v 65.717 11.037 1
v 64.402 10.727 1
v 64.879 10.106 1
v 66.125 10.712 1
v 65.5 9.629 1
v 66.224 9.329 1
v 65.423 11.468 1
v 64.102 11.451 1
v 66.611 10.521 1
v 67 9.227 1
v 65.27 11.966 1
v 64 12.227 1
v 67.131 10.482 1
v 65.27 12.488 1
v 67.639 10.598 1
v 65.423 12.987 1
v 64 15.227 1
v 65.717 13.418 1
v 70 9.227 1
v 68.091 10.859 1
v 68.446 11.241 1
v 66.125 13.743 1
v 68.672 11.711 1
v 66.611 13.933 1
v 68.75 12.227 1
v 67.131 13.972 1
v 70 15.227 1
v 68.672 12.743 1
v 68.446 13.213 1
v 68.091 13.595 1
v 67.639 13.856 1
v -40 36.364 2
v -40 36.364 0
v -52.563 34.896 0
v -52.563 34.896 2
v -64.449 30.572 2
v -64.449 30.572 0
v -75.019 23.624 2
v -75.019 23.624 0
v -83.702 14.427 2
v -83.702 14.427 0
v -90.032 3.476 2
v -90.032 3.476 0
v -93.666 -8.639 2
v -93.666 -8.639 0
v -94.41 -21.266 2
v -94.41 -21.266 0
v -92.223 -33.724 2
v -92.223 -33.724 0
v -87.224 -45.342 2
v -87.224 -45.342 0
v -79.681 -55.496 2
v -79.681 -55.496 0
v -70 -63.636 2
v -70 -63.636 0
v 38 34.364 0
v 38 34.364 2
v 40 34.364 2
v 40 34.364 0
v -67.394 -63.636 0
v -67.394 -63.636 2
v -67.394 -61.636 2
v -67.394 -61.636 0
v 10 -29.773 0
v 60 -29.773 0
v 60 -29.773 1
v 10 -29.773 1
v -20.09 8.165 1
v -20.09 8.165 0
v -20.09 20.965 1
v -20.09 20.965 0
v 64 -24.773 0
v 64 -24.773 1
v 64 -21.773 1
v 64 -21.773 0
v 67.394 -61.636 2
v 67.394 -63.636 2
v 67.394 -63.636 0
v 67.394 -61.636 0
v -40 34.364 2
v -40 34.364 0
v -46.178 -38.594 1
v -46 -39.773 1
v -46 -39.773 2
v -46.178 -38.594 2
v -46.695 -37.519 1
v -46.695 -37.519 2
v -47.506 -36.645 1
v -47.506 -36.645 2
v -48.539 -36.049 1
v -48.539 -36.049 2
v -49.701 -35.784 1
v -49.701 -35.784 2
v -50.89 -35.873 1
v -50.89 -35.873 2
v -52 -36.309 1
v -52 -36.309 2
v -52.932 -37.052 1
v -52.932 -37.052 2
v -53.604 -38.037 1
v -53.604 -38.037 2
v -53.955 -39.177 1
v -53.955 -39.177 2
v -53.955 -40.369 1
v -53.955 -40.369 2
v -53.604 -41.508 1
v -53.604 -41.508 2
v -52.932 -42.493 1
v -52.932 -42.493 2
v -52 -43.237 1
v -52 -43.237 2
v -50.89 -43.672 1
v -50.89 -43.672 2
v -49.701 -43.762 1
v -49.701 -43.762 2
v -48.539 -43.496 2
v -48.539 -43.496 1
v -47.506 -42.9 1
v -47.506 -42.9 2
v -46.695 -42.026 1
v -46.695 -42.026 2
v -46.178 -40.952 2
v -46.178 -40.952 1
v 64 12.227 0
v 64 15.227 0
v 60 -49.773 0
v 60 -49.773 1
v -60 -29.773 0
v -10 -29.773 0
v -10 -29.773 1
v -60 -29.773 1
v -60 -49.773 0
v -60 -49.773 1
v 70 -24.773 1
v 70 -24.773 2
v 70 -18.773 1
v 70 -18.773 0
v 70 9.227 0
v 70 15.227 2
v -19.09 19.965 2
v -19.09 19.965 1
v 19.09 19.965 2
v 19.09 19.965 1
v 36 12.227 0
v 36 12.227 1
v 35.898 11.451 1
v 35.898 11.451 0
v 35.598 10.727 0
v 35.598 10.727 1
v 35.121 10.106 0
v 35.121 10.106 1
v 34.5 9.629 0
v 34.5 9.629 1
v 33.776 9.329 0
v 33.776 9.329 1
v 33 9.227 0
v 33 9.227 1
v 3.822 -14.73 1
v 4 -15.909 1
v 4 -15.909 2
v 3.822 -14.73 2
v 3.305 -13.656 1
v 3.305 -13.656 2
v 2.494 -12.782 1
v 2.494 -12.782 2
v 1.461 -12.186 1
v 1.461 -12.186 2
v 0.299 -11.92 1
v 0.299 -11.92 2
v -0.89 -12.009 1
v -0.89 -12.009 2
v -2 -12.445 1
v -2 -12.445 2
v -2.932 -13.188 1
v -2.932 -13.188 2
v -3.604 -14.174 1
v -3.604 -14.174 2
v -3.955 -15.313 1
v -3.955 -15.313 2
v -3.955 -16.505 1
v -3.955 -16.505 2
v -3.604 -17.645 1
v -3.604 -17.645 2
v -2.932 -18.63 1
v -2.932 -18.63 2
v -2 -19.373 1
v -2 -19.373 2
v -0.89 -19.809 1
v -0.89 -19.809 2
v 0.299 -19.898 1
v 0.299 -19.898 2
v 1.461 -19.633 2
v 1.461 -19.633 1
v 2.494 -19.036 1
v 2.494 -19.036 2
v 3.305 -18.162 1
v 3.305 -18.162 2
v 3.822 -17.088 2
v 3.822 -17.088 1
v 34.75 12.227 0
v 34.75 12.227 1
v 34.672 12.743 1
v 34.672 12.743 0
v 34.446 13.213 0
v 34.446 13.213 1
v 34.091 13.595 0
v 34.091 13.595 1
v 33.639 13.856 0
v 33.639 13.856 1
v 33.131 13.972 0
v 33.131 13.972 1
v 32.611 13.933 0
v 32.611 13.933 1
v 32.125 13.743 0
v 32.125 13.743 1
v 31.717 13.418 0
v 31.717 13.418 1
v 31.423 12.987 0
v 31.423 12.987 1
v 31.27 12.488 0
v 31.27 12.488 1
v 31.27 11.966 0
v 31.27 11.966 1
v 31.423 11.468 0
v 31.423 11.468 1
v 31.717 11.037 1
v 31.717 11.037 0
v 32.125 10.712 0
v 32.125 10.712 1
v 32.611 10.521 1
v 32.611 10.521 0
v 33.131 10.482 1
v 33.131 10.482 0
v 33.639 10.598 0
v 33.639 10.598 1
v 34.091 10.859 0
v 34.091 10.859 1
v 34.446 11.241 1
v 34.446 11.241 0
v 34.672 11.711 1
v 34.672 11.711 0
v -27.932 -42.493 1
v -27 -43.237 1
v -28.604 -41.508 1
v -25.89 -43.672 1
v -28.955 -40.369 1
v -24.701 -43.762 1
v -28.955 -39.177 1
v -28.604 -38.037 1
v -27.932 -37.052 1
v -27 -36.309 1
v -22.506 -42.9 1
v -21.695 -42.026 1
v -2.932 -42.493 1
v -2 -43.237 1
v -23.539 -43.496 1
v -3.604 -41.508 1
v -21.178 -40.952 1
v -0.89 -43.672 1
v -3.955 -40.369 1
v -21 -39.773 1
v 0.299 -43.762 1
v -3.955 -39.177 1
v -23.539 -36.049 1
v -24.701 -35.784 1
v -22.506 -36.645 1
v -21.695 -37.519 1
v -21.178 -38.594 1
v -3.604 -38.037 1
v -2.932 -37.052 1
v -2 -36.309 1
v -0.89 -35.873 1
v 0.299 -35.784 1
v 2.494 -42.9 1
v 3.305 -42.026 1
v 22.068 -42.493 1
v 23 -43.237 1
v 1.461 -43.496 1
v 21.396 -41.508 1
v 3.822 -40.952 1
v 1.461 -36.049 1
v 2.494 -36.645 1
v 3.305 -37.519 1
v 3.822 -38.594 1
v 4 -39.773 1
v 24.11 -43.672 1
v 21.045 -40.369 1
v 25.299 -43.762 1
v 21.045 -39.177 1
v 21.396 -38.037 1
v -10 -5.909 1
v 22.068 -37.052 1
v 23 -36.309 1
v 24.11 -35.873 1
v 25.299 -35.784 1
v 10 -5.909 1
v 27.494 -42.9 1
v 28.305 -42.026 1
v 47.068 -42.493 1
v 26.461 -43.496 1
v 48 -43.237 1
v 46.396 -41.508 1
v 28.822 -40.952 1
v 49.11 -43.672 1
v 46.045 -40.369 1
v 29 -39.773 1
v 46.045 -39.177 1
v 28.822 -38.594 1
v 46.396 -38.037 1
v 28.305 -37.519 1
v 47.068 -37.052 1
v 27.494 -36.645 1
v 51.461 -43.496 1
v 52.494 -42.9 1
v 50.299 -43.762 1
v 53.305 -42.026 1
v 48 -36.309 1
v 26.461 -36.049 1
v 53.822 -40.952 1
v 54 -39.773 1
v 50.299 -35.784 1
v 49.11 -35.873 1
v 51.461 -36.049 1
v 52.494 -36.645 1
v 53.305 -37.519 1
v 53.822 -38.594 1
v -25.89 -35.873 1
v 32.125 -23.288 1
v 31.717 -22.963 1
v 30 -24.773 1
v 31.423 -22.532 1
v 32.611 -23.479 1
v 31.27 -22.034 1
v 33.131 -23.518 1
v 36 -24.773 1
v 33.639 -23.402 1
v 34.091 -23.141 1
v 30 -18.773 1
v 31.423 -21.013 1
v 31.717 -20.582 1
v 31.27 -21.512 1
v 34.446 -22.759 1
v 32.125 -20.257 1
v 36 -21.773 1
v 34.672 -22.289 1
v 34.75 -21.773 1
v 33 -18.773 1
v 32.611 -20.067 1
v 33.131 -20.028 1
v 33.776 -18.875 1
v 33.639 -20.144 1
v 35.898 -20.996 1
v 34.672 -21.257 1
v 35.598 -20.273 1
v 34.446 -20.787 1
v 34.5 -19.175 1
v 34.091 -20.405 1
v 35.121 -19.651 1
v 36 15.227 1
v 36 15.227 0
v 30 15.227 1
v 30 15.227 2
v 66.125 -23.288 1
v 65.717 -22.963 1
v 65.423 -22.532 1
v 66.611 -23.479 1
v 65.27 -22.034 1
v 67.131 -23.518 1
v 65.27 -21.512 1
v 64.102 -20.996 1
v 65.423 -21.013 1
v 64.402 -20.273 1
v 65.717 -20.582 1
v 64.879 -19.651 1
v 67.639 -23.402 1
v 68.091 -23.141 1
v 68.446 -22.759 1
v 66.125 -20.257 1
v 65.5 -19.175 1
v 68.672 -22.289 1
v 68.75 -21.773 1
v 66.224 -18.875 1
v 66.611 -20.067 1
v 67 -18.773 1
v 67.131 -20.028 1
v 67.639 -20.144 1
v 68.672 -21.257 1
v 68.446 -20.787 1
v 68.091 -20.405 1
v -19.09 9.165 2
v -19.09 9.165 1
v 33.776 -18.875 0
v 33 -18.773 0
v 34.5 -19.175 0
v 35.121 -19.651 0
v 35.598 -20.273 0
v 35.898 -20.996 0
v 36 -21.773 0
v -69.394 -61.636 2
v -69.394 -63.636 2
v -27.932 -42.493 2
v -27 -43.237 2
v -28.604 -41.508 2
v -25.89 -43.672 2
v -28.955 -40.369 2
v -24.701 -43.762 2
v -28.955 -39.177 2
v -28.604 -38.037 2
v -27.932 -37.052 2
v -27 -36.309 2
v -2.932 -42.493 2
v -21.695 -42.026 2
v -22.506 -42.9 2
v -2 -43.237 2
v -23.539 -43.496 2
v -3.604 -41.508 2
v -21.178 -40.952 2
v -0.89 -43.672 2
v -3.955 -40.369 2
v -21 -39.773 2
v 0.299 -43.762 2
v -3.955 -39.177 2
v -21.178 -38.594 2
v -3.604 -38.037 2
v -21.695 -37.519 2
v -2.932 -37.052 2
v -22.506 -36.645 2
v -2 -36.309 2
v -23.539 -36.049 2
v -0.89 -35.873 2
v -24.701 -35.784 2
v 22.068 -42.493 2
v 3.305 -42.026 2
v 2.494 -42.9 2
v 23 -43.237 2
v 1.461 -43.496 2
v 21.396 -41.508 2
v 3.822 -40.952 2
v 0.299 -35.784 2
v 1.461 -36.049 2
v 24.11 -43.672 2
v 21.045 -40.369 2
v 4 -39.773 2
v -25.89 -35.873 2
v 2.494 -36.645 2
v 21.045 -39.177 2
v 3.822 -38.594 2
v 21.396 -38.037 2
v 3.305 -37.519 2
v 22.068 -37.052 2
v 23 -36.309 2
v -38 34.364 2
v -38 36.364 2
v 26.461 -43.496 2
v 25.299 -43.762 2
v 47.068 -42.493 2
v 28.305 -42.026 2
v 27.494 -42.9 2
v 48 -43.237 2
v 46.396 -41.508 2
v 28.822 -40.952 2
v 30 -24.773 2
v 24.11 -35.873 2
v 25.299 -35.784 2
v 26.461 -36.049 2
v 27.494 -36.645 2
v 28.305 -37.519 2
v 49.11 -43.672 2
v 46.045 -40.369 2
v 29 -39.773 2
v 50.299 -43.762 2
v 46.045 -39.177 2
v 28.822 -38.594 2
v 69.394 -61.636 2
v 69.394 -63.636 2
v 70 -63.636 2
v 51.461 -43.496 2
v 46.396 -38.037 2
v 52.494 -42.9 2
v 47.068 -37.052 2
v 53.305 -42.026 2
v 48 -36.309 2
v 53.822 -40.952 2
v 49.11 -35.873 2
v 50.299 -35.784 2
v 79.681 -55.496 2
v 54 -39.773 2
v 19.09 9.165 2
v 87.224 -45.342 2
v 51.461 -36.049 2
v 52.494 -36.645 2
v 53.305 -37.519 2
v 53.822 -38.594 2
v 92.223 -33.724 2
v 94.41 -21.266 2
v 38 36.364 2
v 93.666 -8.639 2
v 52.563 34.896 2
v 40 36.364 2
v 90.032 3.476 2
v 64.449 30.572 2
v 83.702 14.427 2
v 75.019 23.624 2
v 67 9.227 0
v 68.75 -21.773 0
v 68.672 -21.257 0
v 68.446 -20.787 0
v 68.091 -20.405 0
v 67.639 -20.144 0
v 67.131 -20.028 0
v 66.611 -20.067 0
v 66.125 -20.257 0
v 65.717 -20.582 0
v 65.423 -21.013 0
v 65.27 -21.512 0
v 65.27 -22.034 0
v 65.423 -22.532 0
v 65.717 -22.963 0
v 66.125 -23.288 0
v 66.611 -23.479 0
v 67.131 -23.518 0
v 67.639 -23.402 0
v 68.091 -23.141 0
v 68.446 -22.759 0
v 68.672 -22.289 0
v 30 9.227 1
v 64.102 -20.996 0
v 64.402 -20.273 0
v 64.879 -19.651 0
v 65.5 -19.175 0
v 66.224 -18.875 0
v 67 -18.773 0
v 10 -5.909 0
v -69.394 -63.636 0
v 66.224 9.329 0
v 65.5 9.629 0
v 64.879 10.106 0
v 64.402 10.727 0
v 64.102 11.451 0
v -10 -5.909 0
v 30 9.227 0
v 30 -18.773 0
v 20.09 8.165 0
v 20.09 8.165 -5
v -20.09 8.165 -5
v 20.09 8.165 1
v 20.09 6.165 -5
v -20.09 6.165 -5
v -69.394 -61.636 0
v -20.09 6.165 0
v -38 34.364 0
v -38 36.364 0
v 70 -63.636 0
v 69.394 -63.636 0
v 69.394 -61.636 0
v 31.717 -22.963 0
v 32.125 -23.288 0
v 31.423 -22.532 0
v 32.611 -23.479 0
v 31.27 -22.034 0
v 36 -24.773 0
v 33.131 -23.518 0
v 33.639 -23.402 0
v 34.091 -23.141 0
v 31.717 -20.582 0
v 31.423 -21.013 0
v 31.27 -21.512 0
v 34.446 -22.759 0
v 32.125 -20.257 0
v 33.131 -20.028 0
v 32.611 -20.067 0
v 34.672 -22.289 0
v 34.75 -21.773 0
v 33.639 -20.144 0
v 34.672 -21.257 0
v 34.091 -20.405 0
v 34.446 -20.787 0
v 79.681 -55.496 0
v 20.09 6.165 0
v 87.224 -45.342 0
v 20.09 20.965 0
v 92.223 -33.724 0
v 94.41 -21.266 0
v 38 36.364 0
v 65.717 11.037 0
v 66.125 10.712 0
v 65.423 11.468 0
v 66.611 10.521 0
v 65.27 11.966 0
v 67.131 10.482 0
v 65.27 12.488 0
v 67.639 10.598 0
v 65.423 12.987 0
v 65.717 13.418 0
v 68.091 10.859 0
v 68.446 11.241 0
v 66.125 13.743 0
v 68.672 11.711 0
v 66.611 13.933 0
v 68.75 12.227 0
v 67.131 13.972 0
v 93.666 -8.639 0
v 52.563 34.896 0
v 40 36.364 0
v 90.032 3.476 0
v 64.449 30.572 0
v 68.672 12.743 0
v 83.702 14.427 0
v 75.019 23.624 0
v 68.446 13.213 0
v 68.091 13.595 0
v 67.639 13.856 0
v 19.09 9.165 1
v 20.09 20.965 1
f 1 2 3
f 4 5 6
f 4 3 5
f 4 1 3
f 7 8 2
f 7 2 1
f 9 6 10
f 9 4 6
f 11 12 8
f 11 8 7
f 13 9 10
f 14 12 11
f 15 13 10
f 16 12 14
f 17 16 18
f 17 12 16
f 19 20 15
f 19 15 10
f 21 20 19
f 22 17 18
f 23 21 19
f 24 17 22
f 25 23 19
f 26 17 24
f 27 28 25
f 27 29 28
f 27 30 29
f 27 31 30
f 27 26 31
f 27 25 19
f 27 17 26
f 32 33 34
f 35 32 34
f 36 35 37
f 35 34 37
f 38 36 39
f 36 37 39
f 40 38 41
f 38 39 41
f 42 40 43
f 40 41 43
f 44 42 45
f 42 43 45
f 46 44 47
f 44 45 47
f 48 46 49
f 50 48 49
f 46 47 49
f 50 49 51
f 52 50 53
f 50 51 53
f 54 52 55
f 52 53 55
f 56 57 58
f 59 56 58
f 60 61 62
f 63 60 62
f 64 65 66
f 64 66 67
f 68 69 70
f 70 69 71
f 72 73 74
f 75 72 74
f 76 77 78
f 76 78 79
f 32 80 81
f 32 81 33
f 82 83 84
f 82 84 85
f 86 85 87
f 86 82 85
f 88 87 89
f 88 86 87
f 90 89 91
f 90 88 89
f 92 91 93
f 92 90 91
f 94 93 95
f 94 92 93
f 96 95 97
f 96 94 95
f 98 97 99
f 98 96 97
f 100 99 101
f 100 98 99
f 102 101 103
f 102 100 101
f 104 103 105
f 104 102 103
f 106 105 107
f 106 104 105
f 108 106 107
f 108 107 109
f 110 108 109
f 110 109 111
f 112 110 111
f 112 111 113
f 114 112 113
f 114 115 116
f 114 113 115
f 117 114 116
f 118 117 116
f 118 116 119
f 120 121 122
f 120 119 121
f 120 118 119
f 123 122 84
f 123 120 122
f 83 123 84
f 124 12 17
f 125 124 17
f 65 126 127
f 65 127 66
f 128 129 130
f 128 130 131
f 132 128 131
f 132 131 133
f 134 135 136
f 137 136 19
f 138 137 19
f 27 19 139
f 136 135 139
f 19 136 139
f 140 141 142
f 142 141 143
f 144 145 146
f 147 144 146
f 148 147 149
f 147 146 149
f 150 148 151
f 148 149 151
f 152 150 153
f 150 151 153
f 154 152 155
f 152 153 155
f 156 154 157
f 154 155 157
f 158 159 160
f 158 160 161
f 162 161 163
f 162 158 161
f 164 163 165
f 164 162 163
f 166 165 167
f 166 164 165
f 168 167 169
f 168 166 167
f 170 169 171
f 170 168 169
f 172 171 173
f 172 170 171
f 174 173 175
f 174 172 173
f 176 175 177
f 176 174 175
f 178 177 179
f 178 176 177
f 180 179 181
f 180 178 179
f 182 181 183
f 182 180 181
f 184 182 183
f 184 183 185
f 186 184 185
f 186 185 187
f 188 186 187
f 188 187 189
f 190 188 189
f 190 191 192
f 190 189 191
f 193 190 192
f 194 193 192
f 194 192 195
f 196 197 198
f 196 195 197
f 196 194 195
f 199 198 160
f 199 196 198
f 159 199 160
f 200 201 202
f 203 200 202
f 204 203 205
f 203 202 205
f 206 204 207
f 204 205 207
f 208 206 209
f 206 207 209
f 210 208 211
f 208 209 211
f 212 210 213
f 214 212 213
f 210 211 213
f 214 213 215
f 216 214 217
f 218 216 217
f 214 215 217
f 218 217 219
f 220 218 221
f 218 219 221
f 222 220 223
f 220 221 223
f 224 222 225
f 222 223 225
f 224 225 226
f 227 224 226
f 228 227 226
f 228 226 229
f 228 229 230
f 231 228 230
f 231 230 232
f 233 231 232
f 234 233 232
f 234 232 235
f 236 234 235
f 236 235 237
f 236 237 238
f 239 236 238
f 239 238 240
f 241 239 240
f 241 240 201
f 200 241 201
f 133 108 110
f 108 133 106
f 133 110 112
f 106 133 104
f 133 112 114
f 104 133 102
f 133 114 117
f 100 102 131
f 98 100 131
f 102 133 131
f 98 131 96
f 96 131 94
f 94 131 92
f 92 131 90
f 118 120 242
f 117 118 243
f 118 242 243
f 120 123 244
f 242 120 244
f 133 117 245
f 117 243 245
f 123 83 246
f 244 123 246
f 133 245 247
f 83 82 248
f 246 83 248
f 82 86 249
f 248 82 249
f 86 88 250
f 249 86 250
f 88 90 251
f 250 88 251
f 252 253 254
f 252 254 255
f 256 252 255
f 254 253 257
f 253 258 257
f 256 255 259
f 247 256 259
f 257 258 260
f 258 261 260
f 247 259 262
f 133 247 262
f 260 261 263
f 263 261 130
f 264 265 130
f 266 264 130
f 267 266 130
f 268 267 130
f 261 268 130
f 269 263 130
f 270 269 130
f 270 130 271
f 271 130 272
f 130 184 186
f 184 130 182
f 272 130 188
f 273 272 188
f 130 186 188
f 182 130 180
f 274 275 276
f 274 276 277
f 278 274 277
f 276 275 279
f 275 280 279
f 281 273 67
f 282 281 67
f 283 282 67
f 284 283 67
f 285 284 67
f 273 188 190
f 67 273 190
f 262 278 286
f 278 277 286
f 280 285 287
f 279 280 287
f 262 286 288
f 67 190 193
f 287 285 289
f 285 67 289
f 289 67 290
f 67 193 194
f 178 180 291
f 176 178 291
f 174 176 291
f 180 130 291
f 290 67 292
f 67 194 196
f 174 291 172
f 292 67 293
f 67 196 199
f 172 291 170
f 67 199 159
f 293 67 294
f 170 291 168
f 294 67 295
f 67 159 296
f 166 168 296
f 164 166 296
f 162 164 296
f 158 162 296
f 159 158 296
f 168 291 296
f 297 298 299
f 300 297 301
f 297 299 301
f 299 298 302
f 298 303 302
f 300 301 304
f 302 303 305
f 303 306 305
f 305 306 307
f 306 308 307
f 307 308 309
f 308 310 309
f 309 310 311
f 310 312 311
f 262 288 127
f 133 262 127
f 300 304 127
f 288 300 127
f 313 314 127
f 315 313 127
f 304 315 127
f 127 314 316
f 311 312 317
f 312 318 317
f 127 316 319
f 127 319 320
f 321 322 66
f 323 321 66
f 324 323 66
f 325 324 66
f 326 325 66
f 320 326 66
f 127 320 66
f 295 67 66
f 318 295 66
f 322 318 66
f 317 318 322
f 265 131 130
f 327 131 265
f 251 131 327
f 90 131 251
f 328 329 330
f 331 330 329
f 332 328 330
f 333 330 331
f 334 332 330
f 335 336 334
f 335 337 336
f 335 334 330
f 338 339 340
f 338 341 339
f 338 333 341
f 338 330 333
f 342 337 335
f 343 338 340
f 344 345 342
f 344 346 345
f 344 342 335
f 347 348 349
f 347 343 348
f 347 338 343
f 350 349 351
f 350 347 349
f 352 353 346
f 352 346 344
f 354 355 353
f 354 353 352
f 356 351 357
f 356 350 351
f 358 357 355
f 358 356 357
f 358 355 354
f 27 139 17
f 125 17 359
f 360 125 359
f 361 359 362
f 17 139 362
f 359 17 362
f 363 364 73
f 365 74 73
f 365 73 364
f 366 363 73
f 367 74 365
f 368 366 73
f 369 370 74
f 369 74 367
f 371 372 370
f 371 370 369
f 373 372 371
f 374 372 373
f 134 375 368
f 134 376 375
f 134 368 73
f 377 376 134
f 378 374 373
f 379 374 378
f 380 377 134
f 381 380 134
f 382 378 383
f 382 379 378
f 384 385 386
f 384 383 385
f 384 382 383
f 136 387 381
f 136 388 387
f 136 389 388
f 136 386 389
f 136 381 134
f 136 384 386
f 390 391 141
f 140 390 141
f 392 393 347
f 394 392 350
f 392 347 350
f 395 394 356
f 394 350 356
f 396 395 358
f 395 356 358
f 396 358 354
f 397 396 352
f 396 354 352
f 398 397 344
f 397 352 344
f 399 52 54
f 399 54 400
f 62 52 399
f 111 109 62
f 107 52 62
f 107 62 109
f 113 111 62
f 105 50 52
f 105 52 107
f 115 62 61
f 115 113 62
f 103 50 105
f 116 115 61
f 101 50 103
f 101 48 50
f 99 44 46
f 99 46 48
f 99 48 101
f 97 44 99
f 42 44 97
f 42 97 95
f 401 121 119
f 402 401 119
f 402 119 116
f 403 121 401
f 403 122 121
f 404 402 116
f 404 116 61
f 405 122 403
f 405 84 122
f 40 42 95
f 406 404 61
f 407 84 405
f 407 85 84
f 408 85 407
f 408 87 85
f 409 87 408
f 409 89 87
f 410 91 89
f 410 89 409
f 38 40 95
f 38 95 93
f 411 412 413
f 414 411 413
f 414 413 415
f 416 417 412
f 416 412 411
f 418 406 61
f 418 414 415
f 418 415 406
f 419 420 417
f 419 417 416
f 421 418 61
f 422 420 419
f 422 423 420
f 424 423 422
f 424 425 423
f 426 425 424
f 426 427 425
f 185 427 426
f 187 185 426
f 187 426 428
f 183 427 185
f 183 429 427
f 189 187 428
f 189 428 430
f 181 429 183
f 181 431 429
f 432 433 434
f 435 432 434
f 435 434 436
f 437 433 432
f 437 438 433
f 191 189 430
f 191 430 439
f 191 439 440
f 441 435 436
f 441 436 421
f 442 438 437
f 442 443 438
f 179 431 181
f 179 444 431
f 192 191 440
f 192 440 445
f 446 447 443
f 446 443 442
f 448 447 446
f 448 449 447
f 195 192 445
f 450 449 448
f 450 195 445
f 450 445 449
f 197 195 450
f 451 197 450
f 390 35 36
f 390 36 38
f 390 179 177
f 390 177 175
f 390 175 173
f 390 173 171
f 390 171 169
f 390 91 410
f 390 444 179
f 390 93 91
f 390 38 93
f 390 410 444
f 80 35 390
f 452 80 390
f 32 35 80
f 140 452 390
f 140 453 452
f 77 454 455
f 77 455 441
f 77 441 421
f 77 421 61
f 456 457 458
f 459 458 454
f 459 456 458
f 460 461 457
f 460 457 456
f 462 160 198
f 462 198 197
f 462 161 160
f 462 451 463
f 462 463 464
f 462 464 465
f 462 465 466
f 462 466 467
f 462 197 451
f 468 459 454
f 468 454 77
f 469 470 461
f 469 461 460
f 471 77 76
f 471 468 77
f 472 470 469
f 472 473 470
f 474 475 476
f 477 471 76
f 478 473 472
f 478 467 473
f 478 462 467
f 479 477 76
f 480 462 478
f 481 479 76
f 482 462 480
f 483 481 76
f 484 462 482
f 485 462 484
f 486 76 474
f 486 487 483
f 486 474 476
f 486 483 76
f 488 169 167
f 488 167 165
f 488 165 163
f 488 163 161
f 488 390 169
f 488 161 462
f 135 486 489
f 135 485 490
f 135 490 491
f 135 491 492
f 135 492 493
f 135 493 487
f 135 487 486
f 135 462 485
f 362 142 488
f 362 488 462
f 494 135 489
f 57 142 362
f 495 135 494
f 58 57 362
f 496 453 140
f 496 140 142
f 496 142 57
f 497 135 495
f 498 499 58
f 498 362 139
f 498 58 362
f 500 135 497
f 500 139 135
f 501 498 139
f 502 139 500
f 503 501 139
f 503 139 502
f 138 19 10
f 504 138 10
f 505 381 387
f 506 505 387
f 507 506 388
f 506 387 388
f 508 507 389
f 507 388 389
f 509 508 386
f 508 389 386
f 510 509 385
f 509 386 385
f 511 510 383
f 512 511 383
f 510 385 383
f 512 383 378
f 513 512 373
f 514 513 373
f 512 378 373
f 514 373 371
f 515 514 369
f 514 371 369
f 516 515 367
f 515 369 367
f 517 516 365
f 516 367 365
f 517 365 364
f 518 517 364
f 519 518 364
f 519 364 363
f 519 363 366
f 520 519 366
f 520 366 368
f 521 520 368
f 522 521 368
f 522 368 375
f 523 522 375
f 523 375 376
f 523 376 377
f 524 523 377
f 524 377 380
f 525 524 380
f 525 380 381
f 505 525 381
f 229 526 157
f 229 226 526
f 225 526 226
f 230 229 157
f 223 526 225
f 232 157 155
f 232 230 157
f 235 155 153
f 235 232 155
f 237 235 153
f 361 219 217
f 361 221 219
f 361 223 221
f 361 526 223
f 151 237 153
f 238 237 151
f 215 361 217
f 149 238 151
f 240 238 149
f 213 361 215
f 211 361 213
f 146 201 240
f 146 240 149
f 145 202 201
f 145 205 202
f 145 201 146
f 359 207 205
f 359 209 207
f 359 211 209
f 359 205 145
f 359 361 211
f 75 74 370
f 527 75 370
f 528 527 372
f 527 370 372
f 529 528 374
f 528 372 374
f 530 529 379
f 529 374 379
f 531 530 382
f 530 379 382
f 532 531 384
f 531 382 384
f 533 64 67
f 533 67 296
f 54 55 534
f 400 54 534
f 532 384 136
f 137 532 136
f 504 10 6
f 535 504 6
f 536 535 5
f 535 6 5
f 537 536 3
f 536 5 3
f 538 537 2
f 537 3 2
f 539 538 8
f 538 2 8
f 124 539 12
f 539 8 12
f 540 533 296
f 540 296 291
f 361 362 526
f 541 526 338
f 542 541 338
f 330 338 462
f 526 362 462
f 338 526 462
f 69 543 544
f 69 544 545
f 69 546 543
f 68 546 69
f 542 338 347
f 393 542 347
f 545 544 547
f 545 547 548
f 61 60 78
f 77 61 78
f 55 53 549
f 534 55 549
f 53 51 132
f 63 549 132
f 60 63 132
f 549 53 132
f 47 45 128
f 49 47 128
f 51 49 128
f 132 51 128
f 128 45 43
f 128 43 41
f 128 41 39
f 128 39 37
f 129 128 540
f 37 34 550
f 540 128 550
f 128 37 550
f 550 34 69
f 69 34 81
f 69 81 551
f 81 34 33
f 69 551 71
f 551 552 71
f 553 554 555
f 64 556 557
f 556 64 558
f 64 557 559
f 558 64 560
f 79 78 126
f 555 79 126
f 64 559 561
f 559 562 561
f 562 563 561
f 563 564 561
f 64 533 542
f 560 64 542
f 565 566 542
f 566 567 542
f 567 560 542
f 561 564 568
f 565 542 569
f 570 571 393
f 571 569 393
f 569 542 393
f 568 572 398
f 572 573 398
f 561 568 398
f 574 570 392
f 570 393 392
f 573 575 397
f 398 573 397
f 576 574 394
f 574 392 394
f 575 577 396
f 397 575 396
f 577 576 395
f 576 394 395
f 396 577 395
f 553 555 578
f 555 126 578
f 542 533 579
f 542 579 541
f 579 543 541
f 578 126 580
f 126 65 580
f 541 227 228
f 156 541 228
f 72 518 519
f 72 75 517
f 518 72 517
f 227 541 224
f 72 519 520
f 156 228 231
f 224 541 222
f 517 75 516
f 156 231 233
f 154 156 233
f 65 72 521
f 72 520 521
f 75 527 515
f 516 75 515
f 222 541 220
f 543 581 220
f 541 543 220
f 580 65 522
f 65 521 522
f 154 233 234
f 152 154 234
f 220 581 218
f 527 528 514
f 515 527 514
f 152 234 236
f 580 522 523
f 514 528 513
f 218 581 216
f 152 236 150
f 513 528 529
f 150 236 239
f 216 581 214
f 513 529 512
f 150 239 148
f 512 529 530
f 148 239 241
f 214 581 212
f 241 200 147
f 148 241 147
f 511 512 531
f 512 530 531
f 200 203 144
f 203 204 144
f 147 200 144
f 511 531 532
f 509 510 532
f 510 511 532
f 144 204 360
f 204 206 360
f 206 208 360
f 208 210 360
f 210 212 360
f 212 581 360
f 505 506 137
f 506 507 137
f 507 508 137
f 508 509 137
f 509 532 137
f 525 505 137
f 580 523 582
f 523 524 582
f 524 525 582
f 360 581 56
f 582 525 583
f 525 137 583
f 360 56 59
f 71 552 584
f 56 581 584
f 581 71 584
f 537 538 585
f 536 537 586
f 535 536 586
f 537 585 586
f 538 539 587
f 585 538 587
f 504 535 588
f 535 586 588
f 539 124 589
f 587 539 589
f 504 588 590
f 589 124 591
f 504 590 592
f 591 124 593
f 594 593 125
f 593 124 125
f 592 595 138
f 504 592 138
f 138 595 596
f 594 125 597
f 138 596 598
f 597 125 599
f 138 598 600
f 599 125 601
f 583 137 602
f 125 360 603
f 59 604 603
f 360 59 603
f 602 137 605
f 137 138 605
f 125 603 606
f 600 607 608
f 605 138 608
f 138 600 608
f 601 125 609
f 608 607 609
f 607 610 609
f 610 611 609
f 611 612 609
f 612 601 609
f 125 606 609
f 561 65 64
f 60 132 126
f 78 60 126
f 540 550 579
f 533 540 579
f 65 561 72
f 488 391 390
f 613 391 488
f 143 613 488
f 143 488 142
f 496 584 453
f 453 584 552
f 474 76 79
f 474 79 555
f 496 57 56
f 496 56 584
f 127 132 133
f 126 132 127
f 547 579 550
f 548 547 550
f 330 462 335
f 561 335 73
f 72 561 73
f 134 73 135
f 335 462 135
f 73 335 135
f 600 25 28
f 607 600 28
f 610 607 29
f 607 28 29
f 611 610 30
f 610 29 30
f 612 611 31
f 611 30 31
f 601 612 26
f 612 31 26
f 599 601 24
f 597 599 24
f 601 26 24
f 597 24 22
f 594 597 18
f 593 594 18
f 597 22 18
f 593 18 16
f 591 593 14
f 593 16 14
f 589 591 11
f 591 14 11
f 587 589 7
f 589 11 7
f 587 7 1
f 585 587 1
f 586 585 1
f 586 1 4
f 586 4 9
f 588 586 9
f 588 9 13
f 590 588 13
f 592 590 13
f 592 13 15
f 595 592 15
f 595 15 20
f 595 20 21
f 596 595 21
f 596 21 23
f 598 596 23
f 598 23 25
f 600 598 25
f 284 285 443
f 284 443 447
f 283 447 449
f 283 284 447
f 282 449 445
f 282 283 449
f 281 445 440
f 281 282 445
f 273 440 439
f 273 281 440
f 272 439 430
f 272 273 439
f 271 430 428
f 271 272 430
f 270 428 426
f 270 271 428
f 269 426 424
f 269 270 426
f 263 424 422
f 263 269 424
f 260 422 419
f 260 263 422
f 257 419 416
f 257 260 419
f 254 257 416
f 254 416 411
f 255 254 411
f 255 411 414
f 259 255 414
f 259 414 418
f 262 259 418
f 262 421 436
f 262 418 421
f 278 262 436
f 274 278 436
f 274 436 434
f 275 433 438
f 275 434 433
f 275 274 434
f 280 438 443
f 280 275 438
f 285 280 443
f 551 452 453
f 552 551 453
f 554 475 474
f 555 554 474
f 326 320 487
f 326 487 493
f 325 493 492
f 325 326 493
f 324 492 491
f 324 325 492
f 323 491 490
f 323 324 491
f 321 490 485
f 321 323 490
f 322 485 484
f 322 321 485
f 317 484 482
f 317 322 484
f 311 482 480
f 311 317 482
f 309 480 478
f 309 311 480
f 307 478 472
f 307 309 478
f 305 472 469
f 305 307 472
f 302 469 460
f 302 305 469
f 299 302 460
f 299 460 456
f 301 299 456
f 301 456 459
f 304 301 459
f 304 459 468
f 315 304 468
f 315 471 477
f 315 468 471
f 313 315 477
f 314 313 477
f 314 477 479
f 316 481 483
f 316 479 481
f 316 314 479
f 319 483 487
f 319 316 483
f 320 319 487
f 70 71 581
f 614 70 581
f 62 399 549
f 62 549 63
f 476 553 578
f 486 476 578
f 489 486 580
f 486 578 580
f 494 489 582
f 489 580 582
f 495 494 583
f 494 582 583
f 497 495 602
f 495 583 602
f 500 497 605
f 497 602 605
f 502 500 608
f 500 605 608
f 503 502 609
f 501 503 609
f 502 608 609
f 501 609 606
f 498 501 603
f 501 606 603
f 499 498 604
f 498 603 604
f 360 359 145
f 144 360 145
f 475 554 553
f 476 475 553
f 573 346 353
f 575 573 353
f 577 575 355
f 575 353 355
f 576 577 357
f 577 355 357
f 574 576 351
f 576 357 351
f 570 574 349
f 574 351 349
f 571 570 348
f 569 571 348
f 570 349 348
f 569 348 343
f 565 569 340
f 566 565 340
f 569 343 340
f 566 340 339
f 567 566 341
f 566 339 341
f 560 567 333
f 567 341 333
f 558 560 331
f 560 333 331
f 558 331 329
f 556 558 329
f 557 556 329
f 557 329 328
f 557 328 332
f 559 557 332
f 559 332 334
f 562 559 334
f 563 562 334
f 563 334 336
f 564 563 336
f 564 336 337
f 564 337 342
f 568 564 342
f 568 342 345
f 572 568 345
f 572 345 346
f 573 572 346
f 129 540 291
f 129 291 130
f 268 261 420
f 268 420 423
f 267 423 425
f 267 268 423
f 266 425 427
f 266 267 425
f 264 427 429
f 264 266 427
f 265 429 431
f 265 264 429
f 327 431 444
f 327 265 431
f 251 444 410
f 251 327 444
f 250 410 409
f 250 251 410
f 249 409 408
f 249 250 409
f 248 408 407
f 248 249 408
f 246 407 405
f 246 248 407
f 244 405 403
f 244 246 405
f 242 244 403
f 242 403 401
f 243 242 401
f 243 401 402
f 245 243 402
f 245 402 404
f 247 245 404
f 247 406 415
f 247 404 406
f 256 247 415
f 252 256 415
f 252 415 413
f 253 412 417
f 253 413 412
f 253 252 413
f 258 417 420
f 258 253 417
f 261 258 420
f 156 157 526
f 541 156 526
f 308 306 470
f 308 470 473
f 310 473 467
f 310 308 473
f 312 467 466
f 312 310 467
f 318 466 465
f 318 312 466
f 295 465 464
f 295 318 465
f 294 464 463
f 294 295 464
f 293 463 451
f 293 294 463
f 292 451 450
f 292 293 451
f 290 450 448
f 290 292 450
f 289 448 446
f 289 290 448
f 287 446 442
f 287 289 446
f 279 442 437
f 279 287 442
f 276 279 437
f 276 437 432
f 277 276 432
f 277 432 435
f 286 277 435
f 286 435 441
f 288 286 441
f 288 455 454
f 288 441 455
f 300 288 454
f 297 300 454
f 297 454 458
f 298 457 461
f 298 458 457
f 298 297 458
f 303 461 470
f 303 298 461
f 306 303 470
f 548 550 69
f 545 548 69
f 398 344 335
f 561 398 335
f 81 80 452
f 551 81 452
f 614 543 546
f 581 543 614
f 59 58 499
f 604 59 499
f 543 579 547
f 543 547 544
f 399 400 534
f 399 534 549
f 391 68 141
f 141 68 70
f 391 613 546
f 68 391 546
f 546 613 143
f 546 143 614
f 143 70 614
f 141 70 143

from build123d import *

# Parameters (mm, degrees)
BOSS_EXTRUDE1_DEPTH = 2
SKETCH2_W           = 40.18
SKETCH2_H           = 12.8
CUT_EXTRUDE1_DEPTH  = 1
SKETCH3_W           = 38.18
SKETCH3_H           = 10.8
CUT_EXTRUDE4_DEPTH  = 3
SKETCH4_W           = 2
SKETCH4_H           = 2
CUT_EXTRUDE5_DEPTH  = 3
SKETCH5_R           = 4
CUT_EXTRUDE6_DEPTH  = 5
SKETCH7_W           = 40.18
SKETCH7_H           = 2
BOSS_EXTRUDE2_DEPTH = 5
CUT_EXTRUDE10_DEPTH = 1
SKETCH12_W          = 40
SKETCH12_H          = 40
CUT_EXTRUDE11_DEPTH = 1
CUT_EXTRUDE12_REACH = 8
SKETCH13_R          = 1.75


with BuildPart() as part:
    # Sketch1 → Boss-Extrude1 (new body)
    with BuildSketch(Plane.XY):
        with BuildLine():
            Line((-70, -63.636363636), (70, -63.636363636))
            ThreePointArc((70, -63.636363636), (92.201532545, -2.475903873), (40, 36.363636364))
            Line((40, 36.363636364), (-40, 36.363636364))
            ThreePointArc((-40, 36.363636364), (-92.201532545, -2.475903873), (-70, -63.636363636))
        make_face()
    extrude(amount=BOSS_EXTRUDE1_DEPTH)

    # Sketch2 → Cut-Extrude1 (cut)
    with BuildSketch(Plane.XY):
        with Locations((0, 14.564946817)):
            Rectangle(SKETCH2_W, SKETCH2_H)
    extrude(amount=CUT_EXTRUDE1_DEPTH, mode=Mode.SUBTRACT)

    # Sketch3 → Cut-Extrude4 (cut, through all)
    with BuildSketch(Plane.XY):
        with Locations((0, 14.564946817)):
            Rectangle(SKETCH3_W, SKETCH3_H)
    extrude(amount=CUT_EXTRUDE4_DEPTH, mode=Mode.SUBTRACT)

    # Sketch4 → Cut-Extrude5 (cut, through all)
    with BuildSketch(Plane.XY.offset(2)):
        with Locations((-39, 35.363636364)):
            Rectangle(SKETCH4_W, SKETCH4_H)
        with Locations((39, 35.363636364)):
            Rectangle(SKETCH4_W, SKETCH4_H)
        with Locations((-68.39388, -62.636363636)):
            Rectangle(SKETCH4_W, SKETCH4_H)
        with Locations((68.39388, -62.636363636)):
            Rectangle(SKETCH4_W, SKETCH4_H)
    extrude(amount=-CUT_EXTRUDE5_DEPTH, mode=Mode.SUBTRACT)

    # Sketch5 → Cut-Extrude6 (cut)
    with BuildSketch(Plane.XY):
        with Locations((0, -15.909090909)):
            Circle(SKETCH5_R)
        with Locations((0, -39.772727273)):
            Circle(SKETCH5_R)
        with Locations((25, -39.772727273)):
            Circle(SKETCH5_R)
        with Locations((50, -39.772727273)):
            Circle(SKETCH5_R)
        with Locations((-25, -39.772727273)):
            Circle(SKETCH5_R)
        with Locations((-50, -39.772727273)):
            Circle(SKETCH5_R)
    extrude(amount=CUT_EXTRUDE6_DEPTH, mode=Mode.SUBTRACT)

    # Sketch7 → Boss-Extrude2 (add)
    with BuildSketch(Plane(origin=(0, 0, 0), x_dir=(-1, 0, 0), z_dir=(0, 0, -1))):
        with Locations((0, 7.164946817)):
            Rectangle(SKETCH7_W, SKETCH7_H)
    extrude(amount=BOSS_EXTRUDE2_DEPTH)

    # Sketch11 → Cut-Extrude10 (cut)
    with BuildSketch(Plane(origin=(0, 0, 0), x_dir=(-1, 0, 0), z_dir=(0, 0, -1))):
        Polygon((-60, -29.772727273), (-10, -29.772727273), (-10, -5.909090909), (10, -5.909090909), (10, -29.772727273), (60, -29.772727273), (60, -49.772727273), (-60, -49.772727273), align=None)
    extrude(amount=-CUT_EXTRUDE10_DEPTH, mode=Mode.SUBTRACT)

    # Sketch12 → Cut-Extrude11 (cut)
    with BuildSketch(Plane.XY.offset(2)):
        with Locations((50, -4.772727273)):
            Rectangle(SKETCH12_W, SKETCH12_H)
    extrude(amount=-CUT_EXTRUDE11_DEPTH, mode=Mode.SUBTRACT)

    # Sketch13 → Cut-Extrude12 (cut, up to next)
    with BuildSketch(Plane.XY.offset(1), mode=Mode.PRIVATE) as cut_extrude12_sk1:
        with Locations((33, 12.227272727)):
            Circle(SKETCH13_R)
    cut_extrude12_tool1 = extrude(cut_extrude12_sk1.sketch, amount=-CUT_EXTRUDE12_REACH, mode=Mode.PRIVATE) & part.part
    add(cut_extrude12_tool1.solids().sort_by_distance((33, 12.227273, 1))[0], mode=Mode.SUBTRACT)
    # Sketch13 → Cut-Extrude12 (cut, up to next)
    with BuildSketch(Plane.XY.offset(1), mode=Mode.PRIVATE) as cut_extrude12_sk2:
        with Locations((67, 12.227272727)):
            Circle(SKETCH13_R)
    cut_extrude12_tool2 = extrude(cut_extrude12_sk2.sketch, amount=-CUT_EXTRUDE12_REACH, mode=Mode.PRIVATE) & part.part
    add(cut_extrude12_tool2.solids().sort_by_distance((67, 12.227273, 1))[0], mode=Mode.SUBTRACT)
    # Sketch13 → Cut-Extrude12 (cut, up to next)
    with BuildSketch(Plane.XY.offset(1), mode=Mode.PRIVATE) as cut_extrude12_sk3:
        with Locations((33, -21.772727273)):
            Circle(SKETCH13_R)
    cut_extrude12_tool3 = extrude(cut_extrude12_sk3.sketch, amount=-CUT_EXTRUDE12_REACH, mode=Mode.PRIVATE) & part.part
    add(cut_extrude12_tool3.solids().sort_by_distance((33, -21.772727, 1))[0], mode=Mode.SUBTRACT)
    # Sketch13 → Cut-Extrude12 (cut, up to next)
    with BuildSketch(Plane.XY.offset(1), mode=Mode.PRIVATE) as cut_extrude12_sk4:
        with Locations((67, -21.772727273)):
            Circle(SKETCH13_R)
    cut_extrude12_tool4 = extrude(cut_extrude12_sk4.sketch, amount=-CUT_EXTRUDE12_REACH, mode=Mode.PRIVATE) & part.part
    add(cut_extrude12_tool4.solids().sort_by_distance((67, -21.772727, 1))[0], mode=Mode.SUBTRACT)
    # Sketch13 → Cut-Extrude12 (cut, up to next)
    with BuildSketch(Plane.XY.offset(1), mode=Mode.PRIVATE) as cut_extrude12_sk5:
        with BuildLine():
            Line((30, 9.227272727), (30, -18.772727273))
            Line((30, -18.772727273), (33, -18.772727273))
            ThreePointArc((33, -18.772727273), (35.121320344, -19.651406929), (36, -21.772727273))
            Line((36, -21.772727273), (36, -24.772727273))
            Line((36, -24.772727273), (64, -24.772727273))
            Line((64, -24.772727273), (64, -21.772727273))
            ThreePointArc((64, -21.772727273), (64.878679656, -19.651406929), (67, -18.772727273))
            Line((67, -18.772727273), (70, -18.772727273))
            Line((70, -18.772727273), (70, 9.227272727))
            Line((70, 9.227272727), (67, 9.227272727))
            ThreePointArc((67, 9.227272727), (64.878679656, 10.105952384), (64, 12.227272727))
            Line((64, 12.227272727), (64, 15.227272727))
            Line((64, 15.227272727), (36, 15.227272727))
            Line((36, 15.227272727), (36, 12.227272727))
            ThreePointArc((36, 12.227272727), (35.121320344, 10.105952384), (33, 9.227272727))
            Line((33, 9.227272727), (30, 9.227272727))
        make_face()
    cut_extrude12_tool5 = extrude(cut_extrude12_sk5.sketch, amount=-CUT_EXTRUDE12_REACH, mode=Mode.PRIVATE) & part.part
    add(cut_extrude12_tool5.solids().sort_by_distance((50, -4.772727, 1))[0], mode=Mode.SUBTRACT)


solid = part.part
